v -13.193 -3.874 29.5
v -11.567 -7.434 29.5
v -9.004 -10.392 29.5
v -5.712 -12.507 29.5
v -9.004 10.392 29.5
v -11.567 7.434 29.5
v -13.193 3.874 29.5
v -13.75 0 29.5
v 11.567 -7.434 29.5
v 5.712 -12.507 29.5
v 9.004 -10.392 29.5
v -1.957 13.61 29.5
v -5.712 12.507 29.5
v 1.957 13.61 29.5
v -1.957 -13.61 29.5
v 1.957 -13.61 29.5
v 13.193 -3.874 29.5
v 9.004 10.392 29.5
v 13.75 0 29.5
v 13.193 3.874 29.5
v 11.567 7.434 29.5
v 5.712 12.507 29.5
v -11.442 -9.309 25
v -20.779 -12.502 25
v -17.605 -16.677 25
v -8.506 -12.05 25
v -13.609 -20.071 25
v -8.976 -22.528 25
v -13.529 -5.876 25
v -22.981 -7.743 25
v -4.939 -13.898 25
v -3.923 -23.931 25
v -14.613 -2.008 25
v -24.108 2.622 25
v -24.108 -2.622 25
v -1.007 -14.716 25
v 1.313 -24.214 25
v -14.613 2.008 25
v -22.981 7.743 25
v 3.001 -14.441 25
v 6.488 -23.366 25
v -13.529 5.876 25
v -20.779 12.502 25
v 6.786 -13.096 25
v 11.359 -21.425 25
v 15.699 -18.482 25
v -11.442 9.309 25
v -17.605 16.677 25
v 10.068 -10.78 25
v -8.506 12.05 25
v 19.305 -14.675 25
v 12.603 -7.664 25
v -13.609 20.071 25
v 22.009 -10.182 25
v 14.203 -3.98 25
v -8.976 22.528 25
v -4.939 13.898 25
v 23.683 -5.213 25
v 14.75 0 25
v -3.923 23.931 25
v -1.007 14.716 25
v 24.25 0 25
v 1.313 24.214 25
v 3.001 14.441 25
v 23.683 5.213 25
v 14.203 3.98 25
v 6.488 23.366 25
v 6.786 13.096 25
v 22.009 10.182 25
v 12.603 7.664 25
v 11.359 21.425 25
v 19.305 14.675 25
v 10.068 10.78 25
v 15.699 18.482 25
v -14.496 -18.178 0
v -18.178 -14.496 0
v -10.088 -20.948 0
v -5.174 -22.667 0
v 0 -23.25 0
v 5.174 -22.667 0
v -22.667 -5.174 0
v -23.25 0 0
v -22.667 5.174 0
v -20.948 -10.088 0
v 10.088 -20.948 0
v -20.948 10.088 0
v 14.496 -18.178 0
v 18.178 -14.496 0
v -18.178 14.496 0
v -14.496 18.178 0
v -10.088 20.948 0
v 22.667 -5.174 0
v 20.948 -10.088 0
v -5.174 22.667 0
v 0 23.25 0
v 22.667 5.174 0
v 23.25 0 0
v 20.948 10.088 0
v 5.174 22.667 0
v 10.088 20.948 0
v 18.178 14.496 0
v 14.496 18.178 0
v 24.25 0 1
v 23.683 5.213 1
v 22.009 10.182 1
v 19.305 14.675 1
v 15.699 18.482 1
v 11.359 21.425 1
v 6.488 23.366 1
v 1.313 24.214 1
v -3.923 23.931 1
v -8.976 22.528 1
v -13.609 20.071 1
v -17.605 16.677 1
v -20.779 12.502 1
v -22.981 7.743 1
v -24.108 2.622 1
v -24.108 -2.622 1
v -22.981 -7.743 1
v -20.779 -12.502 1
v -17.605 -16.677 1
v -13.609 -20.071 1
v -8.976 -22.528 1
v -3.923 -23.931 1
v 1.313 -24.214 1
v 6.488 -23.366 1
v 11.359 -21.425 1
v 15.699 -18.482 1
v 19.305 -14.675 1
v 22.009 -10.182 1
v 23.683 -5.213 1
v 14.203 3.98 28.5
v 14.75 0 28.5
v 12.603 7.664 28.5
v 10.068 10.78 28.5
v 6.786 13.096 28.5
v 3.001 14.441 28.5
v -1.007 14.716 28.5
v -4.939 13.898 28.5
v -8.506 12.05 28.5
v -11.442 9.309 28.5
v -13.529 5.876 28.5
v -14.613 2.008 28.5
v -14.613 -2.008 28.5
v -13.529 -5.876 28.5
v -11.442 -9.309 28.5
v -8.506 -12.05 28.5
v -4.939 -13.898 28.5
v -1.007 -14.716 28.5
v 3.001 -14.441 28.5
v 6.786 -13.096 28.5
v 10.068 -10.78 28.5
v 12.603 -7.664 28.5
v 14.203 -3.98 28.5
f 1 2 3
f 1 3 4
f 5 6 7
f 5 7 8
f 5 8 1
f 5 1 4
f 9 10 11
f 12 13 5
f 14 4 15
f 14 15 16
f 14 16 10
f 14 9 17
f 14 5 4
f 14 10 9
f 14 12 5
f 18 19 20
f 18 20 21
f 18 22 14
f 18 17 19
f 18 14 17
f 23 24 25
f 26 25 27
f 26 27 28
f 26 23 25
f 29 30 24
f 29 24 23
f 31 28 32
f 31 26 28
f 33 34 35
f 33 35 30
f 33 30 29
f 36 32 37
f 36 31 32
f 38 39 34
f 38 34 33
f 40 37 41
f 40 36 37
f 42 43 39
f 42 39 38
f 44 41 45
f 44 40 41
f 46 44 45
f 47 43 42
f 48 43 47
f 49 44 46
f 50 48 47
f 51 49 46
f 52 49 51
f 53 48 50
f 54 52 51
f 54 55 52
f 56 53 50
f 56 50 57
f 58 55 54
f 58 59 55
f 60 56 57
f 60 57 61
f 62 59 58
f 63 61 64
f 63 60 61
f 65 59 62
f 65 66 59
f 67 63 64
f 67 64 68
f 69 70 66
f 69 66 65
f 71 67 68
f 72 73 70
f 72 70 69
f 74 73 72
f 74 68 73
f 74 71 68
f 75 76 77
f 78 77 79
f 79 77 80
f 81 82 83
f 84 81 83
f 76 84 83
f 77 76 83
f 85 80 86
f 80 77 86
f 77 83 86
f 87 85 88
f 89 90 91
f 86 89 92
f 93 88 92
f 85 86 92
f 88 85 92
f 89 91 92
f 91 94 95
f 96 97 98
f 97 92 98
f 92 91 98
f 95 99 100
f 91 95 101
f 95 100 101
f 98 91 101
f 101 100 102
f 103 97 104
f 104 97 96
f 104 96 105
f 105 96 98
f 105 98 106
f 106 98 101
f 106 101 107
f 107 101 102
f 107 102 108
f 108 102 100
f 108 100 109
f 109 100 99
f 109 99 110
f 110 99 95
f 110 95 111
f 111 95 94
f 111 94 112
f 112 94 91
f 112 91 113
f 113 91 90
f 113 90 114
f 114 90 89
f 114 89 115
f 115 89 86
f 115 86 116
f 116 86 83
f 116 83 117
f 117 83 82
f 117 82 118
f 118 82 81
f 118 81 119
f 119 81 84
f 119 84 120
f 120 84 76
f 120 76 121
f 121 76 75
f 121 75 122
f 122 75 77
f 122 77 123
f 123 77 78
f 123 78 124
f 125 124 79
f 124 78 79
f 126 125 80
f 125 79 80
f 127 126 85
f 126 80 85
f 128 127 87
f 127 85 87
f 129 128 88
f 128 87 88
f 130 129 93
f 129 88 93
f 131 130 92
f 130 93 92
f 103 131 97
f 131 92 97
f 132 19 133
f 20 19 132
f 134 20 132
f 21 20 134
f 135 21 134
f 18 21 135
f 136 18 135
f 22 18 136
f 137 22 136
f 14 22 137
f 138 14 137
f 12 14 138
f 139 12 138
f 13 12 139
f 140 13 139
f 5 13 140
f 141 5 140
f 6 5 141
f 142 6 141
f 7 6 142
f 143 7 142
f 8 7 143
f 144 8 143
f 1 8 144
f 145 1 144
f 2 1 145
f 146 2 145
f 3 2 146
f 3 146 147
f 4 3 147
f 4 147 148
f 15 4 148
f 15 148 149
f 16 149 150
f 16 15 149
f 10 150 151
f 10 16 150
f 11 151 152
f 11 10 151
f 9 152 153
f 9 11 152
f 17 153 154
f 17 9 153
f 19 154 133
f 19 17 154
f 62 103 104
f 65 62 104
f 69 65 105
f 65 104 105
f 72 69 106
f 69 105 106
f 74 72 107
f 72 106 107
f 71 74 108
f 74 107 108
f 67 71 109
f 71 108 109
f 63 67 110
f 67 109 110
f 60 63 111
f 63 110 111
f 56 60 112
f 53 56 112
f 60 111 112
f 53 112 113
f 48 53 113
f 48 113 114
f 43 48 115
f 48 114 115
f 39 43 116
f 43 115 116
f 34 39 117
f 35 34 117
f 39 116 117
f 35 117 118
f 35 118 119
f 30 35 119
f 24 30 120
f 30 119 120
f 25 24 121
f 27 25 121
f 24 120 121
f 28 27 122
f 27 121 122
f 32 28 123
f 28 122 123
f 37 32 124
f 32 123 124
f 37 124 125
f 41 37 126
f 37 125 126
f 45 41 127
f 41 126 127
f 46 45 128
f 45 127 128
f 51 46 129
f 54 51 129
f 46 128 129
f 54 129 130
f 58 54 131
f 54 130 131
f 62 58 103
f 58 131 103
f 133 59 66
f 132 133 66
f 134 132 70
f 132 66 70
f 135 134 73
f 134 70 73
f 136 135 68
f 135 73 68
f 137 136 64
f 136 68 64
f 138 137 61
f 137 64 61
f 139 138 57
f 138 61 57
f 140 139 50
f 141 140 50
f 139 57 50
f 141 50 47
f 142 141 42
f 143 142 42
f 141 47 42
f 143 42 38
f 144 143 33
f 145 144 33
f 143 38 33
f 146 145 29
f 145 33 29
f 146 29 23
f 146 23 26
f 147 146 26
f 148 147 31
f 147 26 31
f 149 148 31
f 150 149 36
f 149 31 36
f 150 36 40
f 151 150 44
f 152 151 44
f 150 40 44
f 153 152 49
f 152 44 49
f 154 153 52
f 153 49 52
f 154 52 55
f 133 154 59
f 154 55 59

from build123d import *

# Parameters (mm, degrees)
F0_R     = 24.25
F1_DEPTH = 25
F2_R     = 14.75
F3_DEPTH = 4.5
F4_SIZE  = 1


with BuildPart() as f1:
    # F0 (on Top) → F1 (new body)
    with BuildSketch(Plane.XY):
        Circle(F0_R)
    extrude(amount=F1_DEPTH)

    # F2 (on face) → F3 (join)
    with BuildSketch(Plane.XY.offset(25)):
        Circle(F2_R)
    extrude(amount=F3_DEPTH)

    # F4
    f4_edges = [f1.edges().sort_by_distance(p)[0] for p in [
        (-14.75, 0, 29.5),
        (-24.25, 0, 0),
    ]]
    chamfer(f4_edges, length=F4_SIZE)


solid = f1.part
